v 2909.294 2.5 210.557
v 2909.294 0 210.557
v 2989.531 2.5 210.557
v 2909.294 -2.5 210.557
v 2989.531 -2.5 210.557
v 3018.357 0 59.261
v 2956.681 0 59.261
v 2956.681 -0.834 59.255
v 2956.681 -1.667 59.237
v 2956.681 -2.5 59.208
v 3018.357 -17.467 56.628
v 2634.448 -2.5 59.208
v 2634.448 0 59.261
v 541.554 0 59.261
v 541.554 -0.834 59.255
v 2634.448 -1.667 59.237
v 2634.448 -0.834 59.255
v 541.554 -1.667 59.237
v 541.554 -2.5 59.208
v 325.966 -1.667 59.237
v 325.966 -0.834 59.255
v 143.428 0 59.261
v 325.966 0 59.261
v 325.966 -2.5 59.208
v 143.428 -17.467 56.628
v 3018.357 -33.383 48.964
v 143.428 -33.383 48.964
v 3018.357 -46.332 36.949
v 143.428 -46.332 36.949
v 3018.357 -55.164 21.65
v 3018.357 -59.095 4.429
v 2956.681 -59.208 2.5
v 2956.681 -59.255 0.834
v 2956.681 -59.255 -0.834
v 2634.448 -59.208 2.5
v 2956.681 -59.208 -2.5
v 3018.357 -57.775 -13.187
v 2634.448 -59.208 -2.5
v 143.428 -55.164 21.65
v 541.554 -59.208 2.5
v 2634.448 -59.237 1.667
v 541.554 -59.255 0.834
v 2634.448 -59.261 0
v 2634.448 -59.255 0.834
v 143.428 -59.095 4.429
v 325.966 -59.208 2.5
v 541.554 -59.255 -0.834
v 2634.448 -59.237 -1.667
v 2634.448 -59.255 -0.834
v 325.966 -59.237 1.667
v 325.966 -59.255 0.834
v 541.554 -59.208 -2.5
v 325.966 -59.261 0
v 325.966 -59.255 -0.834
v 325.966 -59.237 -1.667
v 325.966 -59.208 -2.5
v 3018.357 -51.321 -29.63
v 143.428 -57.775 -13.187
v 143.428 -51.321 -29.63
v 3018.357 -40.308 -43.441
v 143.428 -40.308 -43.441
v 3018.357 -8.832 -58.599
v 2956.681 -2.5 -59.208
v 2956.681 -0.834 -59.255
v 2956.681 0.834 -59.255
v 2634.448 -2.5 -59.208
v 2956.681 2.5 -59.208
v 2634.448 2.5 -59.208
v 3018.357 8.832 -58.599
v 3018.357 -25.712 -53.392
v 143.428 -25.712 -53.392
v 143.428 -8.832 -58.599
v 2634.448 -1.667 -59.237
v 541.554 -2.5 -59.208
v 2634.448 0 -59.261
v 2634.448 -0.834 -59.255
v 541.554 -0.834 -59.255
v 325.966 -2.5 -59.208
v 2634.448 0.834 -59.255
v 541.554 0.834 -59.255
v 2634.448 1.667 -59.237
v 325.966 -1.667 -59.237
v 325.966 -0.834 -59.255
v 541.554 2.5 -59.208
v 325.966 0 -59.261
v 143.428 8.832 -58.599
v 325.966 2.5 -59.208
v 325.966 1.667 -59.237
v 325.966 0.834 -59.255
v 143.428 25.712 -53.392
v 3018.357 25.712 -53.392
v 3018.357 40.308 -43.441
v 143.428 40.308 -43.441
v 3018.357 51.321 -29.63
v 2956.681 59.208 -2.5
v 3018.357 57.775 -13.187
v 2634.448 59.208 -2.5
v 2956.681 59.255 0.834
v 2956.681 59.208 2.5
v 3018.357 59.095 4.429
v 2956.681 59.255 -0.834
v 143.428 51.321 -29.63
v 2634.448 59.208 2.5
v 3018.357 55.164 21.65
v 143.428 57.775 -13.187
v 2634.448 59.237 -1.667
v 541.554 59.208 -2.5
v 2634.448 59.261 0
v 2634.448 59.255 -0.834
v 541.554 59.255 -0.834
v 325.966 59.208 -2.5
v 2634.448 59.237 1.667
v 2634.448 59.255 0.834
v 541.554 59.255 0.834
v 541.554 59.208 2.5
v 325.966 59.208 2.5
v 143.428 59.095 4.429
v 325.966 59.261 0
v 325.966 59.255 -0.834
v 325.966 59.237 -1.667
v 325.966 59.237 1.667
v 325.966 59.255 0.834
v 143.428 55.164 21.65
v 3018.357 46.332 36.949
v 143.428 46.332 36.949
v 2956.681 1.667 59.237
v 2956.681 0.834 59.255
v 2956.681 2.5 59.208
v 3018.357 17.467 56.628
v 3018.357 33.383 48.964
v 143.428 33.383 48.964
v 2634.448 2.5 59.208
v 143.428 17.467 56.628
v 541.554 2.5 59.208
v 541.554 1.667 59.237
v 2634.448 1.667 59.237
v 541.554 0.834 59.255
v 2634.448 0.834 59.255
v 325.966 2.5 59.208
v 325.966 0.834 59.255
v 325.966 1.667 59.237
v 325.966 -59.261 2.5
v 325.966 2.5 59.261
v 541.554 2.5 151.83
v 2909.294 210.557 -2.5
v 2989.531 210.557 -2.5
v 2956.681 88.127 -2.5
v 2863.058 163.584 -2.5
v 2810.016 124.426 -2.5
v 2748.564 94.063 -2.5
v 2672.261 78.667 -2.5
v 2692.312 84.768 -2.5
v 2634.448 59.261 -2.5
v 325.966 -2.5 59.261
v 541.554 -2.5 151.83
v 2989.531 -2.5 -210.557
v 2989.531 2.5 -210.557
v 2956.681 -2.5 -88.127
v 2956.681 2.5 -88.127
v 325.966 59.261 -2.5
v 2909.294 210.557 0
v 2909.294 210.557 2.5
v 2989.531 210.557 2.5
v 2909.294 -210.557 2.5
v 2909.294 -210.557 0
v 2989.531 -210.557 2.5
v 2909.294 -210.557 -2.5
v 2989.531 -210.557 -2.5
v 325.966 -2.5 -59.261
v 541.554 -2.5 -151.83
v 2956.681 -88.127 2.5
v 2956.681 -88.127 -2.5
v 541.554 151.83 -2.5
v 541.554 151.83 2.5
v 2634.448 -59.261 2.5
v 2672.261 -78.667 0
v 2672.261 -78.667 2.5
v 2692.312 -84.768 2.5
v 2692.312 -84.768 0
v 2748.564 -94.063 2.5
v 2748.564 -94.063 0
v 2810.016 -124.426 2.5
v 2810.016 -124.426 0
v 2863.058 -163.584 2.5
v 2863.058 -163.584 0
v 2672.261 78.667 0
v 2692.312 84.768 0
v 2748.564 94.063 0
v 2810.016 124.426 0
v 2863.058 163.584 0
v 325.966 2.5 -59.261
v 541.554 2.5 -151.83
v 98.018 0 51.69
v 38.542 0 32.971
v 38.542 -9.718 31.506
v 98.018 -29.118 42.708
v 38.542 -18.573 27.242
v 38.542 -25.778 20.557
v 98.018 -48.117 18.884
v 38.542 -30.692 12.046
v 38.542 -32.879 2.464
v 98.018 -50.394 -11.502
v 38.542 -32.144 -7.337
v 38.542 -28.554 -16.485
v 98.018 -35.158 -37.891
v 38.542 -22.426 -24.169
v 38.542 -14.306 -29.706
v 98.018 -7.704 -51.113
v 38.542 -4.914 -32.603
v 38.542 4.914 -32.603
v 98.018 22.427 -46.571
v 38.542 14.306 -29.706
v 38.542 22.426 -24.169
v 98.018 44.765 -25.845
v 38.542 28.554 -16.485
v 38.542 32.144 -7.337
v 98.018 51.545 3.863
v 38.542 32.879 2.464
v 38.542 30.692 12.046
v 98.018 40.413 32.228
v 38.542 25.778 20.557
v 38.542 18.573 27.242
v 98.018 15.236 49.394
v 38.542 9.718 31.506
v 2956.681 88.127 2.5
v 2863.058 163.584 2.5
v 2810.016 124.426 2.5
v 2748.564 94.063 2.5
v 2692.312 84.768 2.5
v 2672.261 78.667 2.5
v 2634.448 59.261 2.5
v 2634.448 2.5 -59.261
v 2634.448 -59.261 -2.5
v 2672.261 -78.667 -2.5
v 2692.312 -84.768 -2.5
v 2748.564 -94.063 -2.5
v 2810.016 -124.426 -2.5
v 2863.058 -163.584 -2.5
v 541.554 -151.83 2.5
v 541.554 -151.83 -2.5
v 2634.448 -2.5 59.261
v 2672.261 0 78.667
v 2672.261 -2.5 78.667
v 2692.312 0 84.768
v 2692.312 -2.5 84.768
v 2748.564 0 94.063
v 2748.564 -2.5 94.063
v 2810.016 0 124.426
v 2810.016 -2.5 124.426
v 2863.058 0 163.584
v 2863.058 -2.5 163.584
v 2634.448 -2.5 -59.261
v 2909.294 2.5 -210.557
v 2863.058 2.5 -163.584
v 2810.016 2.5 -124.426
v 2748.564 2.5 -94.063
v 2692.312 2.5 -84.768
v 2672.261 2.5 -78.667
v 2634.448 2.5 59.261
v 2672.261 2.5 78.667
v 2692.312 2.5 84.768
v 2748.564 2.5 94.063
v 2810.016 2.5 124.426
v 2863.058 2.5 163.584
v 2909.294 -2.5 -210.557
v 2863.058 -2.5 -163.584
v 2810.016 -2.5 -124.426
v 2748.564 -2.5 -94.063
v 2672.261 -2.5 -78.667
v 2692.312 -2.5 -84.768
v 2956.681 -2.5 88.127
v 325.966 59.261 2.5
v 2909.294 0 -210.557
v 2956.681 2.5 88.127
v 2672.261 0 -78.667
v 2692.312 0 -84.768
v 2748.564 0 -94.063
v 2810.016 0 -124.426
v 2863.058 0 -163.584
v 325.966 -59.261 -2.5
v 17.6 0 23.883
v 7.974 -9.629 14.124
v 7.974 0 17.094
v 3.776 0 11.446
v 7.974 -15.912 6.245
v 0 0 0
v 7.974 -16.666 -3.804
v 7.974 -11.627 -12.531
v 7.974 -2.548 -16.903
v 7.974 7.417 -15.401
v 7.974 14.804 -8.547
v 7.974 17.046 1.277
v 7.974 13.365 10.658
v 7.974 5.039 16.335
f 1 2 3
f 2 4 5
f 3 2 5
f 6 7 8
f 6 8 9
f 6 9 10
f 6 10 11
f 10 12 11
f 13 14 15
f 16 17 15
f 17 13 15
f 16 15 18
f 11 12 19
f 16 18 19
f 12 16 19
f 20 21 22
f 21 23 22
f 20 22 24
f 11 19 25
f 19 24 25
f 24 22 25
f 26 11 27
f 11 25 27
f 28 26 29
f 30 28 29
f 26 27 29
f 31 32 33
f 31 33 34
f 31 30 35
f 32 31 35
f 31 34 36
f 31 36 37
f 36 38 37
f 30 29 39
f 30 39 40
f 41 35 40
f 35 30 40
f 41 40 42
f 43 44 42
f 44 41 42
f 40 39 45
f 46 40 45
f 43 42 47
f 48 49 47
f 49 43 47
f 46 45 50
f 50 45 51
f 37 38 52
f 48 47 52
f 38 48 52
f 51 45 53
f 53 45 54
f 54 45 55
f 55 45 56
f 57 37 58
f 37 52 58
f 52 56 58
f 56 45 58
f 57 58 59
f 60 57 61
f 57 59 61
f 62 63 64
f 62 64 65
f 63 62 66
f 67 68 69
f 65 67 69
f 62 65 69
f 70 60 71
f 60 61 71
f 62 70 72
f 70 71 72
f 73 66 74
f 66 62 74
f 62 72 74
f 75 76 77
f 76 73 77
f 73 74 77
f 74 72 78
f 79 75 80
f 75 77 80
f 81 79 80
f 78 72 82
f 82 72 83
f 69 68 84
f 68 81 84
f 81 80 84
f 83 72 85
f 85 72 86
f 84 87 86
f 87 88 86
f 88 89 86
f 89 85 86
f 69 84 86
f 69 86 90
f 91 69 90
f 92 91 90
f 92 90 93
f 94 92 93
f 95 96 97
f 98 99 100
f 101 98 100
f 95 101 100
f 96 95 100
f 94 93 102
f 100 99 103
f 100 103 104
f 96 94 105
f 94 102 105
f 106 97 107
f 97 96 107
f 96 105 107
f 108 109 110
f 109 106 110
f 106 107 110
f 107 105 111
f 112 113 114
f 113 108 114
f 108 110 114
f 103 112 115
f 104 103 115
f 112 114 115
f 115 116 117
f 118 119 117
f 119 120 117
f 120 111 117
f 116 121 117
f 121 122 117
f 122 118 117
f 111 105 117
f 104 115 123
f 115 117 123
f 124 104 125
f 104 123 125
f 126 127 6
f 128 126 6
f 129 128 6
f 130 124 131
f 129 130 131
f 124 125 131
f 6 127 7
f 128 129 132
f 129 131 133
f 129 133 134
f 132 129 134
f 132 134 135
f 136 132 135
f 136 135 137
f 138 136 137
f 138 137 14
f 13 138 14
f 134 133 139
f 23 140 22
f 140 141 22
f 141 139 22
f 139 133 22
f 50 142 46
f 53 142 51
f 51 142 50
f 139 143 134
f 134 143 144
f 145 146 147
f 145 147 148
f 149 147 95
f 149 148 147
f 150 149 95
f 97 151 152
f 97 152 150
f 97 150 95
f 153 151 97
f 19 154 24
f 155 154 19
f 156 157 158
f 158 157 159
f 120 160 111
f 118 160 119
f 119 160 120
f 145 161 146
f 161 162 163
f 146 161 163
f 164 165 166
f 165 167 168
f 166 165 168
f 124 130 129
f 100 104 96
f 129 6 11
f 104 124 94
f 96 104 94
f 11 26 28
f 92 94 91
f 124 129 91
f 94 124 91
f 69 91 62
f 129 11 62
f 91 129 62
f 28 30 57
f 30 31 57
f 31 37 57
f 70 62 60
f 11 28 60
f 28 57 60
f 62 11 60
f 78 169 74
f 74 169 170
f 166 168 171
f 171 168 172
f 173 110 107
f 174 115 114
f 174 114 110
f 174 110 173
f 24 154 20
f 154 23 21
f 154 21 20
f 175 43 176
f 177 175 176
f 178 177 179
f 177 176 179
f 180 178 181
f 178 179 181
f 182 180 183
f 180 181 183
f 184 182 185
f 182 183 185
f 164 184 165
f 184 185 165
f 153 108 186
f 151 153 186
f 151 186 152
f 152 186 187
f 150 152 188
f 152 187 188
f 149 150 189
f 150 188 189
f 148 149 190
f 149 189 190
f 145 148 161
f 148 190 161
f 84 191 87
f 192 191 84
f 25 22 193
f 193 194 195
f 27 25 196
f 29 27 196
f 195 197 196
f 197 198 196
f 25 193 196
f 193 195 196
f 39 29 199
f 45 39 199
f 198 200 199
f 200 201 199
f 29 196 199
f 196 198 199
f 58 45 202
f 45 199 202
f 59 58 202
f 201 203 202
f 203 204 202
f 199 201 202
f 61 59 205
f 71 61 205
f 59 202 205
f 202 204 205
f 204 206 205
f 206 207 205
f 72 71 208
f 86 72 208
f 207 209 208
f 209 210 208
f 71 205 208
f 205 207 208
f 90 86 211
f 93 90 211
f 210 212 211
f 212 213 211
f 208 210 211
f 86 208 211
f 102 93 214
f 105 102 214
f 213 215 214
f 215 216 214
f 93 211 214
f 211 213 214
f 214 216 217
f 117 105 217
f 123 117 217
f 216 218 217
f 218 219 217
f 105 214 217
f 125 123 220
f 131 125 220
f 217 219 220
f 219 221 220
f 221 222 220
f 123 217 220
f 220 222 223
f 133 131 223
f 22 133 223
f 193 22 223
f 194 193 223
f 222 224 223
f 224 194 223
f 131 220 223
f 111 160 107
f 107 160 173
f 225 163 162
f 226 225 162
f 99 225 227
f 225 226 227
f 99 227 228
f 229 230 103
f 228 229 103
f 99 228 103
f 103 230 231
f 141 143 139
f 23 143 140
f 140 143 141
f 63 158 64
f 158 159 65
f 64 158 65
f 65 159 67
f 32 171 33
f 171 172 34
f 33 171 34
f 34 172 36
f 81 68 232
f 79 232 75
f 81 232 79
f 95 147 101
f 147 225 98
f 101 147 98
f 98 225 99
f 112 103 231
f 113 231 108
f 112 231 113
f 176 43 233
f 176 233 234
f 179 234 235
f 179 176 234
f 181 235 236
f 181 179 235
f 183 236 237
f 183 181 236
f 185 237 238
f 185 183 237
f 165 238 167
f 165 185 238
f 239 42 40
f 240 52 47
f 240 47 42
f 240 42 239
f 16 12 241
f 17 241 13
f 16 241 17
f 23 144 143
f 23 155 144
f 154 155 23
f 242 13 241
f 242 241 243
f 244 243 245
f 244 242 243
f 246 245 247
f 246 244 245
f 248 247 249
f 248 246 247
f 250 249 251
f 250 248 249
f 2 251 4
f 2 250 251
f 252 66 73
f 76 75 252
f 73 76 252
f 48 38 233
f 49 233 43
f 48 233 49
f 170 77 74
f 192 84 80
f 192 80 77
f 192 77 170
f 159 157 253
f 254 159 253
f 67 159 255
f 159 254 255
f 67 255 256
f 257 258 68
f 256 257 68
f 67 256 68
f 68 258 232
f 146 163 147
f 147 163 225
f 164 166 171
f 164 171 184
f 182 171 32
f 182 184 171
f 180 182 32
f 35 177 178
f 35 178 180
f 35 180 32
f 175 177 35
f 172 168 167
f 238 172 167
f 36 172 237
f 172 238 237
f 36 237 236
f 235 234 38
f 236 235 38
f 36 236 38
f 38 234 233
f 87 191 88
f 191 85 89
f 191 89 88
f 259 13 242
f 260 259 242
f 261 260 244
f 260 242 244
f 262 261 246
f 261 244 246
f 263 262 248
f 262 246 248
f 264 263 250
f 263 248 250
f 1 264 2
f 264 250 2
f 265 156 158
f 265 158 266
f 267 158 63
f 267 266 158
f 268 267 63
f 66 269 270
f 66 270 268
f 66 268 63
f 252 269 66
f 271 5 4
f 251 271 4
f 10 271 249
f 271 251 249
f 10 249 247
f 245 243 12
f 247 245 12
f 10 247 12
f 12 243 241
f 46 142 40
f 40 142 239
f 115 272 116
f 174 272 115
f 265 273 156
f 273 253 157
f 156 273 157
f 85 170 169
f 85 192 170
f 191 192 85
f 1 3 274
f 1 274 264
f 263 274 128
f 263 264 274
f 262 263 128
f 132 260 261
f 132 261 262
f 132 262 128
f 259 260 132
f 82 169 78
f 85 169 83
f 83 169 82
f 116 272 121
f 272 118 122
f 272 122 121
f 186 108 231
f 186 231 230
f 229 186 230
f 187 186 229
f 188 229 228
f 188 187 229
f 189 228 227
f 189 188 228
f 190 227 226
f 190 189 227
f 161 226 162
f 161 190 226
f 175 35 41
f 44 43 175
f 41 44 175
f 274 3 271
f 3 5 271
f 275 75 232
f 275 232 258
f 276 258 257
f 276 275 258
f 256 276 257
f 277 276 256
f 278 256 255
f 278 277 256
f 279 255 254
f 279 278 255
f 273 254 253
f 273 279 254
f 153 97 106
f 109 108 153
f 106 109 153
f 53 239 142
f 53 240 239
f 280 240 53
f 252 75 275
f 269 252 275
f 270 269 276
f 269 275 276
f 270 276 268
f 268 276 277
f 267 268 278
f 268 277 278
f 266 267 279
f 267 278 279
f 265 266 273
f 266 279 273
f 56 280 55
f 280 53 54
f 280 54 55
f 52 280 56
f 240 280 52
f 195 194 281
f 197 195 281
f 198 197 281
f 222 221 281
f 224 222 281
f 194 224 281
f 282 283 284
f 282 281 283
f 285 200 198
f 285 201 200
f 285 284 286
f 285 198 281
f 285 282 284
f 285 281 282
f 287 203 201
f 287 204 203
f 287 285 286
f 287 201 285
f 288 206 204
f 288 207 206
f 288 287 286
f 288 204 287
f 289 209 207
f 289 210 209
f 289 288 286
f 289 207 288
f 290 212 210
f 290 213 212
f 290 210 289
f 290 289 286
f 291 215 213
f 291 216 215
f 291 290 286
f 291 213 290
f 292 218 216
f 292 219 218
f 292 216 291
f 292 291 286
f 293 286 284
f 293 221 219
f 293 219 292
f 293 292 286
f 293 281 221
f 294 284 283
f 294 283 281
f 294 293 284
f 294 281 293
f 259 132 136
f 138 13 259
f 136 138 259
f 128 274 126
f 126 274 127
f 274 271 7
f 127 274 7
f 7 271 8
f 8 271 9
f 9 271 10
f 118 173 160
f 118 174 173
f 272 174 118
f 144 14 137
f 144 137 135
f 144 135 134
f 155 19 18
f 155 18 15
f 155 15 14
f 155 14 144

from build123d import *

# Parameters (mm, degrees)
BOSS_EXTRUDE1_DEPTH   = 0.902201371
BOSS_EXTRUDE1_2_DEPTH = 0.902201371
CIRPATTERN1_COUNT     = 4
SCALE1_SCALE          = 2.771


with BuildPart() as part:
    # Sketch1 → Revolve1 (revolve)
    with BuildSketch(Plane.XY, mode=Mode.PRIVATE) as revolve1_sk:
        with BuildLine():
            Line((63.643304359, 93.059708555), (1152.909561315, 93.059708555))
            Line((1152.909561315, 93.059708555), (1152.909561315, 114.445778471))
            Line((1152.909561315, 114.445778471), (115.403746693, 114.445778471))
            add(Edge.make_bspline(
                [(115.403746693, 114.445778471), (102.463666757, 114.445778471), (77.55245191, 104.958295762)],
                knots=[0, 0, 0, 1, 1, 1], degree=2, weights=[1, 0.736255411, 1]))
            add(Edge.make_bspline(
                [(63.643304359, 93.059708555), (65.069439255, 100.204117075), (77.55245191, 104.958295762)],
                knots=[0, 0, 0, 1, 1, 1], degree=2, weights=[1, 1.72125143, 1]))
        make_face()
    revolve(revolve1_sk.sketch.rotate(Axis((63.643304359, 93.059708555, 0), (1, 0, 0)), 90), axis=Axis((63.643304359, 93.059708555, 0), (1, 0, 0)))


with BuildPart() as body_2:
    # Sketch2 → Boss-Extrude1 (new, symmetric)
    with BuildSketch(Plane.XY):
        Polygon((259.079476353, 114.445778471), (259.079476353, 147.852331242), (181.277999104, 114.445778471), (181.277999104, 105.090857442), (259.079476353, 105.090857442), align=None)
    extrude(amount=BOSS_EXTRUDE1_DEPTH, both=True)


with BuildPart() as body_3:
    # Sketch2 → Boss-Extrude1 2 (new, symmetric)
    with BuildSketch(Plane.XY):
        with BuildLine():
            Line((1113.550929378, 169.045735687), (1142.506929378, 169.045735687))
            Line((1142.506929378, 169.045735687), (1130.651812443, 124.862875572))
            Line((1130.651812443, 124.862875572), (1130.651812443, 114.445778471))
            Line((1130.651812443, 114.445778471), (1130.651812443, 107.968193666))
            Line((1130.651812443, 107.968193666), (1014.36417402, 107.968193666))
            Line((1014.36417402, 107.968193666), (1014.36417402, 114.445778471))
            add(Edge.make_bspline(
                [(1014.36417402, 114.445778471), (1020.032573854, 116.832444148), (1026.950065647, 122.053258444), (1038.084104276, 124.268686165), (1046.140189388, 124.440949217), (1056.240129616, 126.835056232), (1068.272190617, 132.565543152), (1082.756221106, 140.522252136), (1098.49699024, 153.111183607), (1108.717711795, 162.820126579), (1113.550929378, 169.045735687)],
                knots=[0, 0, 0, 0, 0.162091832, 0.213838651, 0.291545337, 0.370216786, 0.480165561, 0.635423902, 0.796986484, 1, 1, 1, 1], degree=3))
        make_face()
    extrude(amount=BOSS_EXTRUDE1_2_DEPTH, both=True)


with BuildPart() as cirpattern1_1:
    # CirPattern1: pattern copy
    add(body_3.part.rotate(Axis((63.643304359, 93.059708555, 0), (-1, 0, 0)), 1 * 360 / CIRPATTERN1_COUNT))


with BuildPart() as cirpattern1_2:
    # CirPattern1: pattern copy
    add(body_3.part.rotate(Axis((63.643304359, 93.059708555, 0), (-1, 0, 0)), 2 * 360 / CIRPATTERN1_COUNT))


with BuildPart() as cirpattern1_3:
    # CirPattern1: pattern copy
    add(body_3.part.rotate(Axis((63.643304359, 93.059708555, 0), (-1, 0, 0)), 3 * 360 / CIRPATTERN1_COUNT))


with BuildPart() as cirpattern1_4:
    # CirPattern1: pattern copy
    add(body_2.part.rotate(Axis((63.643304359, 93.059708555, 0), (-1, 0, 0)), 1 * 360 / CIRPATTERN1_COUNT))


with BuildPart() as cirpattern1_5:
    # CirPattern1: pattern copy
    add(body_2.part.rotate(Axis((63.643304359, 93.059708555, 0), (-1, 0, 0)), 2 * 360 / CIRPATTERN1_COUNT))


with BuildPart() as cirpattern1_6:
    # CirPattern1: pattern copy
    add(body_2.part.rotate(Axis((63.643304359, 93.059708555, 0), (-1, 0, 0)), 3 * 360 / CIRPATTERN1_COUNT))


with BuildPart() as body_2_1:
    add(body_2.part)

    # Combine1: union CirPattern1_6, CirPattern1_5, CirPattern1_4, body 3, CirPattern1_1, CirPattern1_3, part, CirPattern1_2
    add(cirpattern1_6.part)
    add(cirpattern1_5.part)
    add(cirpattern1_4.part)
    add(body_3.part)
    add(cirpattern1_1.part)
    add(cirpattern1_3.part)
    add(part.part)
    add(cirpattern1_2.part)


with BuildPart() as body_2_2:
    # Scale1: scaled about (0, 0, 0)
    add(body_2_1.part.scale(SCALE1_SCALE))


with BuildPart() as body_2_3:
    # Body-Move/Copy1: read off the stored shape, not the designer's step
    # Body-Move/Copy1: moved
    add(body_2_2.part.moved(Location((-176.3555964, -257.8684524, 0))))


solid = body_2_3.part
